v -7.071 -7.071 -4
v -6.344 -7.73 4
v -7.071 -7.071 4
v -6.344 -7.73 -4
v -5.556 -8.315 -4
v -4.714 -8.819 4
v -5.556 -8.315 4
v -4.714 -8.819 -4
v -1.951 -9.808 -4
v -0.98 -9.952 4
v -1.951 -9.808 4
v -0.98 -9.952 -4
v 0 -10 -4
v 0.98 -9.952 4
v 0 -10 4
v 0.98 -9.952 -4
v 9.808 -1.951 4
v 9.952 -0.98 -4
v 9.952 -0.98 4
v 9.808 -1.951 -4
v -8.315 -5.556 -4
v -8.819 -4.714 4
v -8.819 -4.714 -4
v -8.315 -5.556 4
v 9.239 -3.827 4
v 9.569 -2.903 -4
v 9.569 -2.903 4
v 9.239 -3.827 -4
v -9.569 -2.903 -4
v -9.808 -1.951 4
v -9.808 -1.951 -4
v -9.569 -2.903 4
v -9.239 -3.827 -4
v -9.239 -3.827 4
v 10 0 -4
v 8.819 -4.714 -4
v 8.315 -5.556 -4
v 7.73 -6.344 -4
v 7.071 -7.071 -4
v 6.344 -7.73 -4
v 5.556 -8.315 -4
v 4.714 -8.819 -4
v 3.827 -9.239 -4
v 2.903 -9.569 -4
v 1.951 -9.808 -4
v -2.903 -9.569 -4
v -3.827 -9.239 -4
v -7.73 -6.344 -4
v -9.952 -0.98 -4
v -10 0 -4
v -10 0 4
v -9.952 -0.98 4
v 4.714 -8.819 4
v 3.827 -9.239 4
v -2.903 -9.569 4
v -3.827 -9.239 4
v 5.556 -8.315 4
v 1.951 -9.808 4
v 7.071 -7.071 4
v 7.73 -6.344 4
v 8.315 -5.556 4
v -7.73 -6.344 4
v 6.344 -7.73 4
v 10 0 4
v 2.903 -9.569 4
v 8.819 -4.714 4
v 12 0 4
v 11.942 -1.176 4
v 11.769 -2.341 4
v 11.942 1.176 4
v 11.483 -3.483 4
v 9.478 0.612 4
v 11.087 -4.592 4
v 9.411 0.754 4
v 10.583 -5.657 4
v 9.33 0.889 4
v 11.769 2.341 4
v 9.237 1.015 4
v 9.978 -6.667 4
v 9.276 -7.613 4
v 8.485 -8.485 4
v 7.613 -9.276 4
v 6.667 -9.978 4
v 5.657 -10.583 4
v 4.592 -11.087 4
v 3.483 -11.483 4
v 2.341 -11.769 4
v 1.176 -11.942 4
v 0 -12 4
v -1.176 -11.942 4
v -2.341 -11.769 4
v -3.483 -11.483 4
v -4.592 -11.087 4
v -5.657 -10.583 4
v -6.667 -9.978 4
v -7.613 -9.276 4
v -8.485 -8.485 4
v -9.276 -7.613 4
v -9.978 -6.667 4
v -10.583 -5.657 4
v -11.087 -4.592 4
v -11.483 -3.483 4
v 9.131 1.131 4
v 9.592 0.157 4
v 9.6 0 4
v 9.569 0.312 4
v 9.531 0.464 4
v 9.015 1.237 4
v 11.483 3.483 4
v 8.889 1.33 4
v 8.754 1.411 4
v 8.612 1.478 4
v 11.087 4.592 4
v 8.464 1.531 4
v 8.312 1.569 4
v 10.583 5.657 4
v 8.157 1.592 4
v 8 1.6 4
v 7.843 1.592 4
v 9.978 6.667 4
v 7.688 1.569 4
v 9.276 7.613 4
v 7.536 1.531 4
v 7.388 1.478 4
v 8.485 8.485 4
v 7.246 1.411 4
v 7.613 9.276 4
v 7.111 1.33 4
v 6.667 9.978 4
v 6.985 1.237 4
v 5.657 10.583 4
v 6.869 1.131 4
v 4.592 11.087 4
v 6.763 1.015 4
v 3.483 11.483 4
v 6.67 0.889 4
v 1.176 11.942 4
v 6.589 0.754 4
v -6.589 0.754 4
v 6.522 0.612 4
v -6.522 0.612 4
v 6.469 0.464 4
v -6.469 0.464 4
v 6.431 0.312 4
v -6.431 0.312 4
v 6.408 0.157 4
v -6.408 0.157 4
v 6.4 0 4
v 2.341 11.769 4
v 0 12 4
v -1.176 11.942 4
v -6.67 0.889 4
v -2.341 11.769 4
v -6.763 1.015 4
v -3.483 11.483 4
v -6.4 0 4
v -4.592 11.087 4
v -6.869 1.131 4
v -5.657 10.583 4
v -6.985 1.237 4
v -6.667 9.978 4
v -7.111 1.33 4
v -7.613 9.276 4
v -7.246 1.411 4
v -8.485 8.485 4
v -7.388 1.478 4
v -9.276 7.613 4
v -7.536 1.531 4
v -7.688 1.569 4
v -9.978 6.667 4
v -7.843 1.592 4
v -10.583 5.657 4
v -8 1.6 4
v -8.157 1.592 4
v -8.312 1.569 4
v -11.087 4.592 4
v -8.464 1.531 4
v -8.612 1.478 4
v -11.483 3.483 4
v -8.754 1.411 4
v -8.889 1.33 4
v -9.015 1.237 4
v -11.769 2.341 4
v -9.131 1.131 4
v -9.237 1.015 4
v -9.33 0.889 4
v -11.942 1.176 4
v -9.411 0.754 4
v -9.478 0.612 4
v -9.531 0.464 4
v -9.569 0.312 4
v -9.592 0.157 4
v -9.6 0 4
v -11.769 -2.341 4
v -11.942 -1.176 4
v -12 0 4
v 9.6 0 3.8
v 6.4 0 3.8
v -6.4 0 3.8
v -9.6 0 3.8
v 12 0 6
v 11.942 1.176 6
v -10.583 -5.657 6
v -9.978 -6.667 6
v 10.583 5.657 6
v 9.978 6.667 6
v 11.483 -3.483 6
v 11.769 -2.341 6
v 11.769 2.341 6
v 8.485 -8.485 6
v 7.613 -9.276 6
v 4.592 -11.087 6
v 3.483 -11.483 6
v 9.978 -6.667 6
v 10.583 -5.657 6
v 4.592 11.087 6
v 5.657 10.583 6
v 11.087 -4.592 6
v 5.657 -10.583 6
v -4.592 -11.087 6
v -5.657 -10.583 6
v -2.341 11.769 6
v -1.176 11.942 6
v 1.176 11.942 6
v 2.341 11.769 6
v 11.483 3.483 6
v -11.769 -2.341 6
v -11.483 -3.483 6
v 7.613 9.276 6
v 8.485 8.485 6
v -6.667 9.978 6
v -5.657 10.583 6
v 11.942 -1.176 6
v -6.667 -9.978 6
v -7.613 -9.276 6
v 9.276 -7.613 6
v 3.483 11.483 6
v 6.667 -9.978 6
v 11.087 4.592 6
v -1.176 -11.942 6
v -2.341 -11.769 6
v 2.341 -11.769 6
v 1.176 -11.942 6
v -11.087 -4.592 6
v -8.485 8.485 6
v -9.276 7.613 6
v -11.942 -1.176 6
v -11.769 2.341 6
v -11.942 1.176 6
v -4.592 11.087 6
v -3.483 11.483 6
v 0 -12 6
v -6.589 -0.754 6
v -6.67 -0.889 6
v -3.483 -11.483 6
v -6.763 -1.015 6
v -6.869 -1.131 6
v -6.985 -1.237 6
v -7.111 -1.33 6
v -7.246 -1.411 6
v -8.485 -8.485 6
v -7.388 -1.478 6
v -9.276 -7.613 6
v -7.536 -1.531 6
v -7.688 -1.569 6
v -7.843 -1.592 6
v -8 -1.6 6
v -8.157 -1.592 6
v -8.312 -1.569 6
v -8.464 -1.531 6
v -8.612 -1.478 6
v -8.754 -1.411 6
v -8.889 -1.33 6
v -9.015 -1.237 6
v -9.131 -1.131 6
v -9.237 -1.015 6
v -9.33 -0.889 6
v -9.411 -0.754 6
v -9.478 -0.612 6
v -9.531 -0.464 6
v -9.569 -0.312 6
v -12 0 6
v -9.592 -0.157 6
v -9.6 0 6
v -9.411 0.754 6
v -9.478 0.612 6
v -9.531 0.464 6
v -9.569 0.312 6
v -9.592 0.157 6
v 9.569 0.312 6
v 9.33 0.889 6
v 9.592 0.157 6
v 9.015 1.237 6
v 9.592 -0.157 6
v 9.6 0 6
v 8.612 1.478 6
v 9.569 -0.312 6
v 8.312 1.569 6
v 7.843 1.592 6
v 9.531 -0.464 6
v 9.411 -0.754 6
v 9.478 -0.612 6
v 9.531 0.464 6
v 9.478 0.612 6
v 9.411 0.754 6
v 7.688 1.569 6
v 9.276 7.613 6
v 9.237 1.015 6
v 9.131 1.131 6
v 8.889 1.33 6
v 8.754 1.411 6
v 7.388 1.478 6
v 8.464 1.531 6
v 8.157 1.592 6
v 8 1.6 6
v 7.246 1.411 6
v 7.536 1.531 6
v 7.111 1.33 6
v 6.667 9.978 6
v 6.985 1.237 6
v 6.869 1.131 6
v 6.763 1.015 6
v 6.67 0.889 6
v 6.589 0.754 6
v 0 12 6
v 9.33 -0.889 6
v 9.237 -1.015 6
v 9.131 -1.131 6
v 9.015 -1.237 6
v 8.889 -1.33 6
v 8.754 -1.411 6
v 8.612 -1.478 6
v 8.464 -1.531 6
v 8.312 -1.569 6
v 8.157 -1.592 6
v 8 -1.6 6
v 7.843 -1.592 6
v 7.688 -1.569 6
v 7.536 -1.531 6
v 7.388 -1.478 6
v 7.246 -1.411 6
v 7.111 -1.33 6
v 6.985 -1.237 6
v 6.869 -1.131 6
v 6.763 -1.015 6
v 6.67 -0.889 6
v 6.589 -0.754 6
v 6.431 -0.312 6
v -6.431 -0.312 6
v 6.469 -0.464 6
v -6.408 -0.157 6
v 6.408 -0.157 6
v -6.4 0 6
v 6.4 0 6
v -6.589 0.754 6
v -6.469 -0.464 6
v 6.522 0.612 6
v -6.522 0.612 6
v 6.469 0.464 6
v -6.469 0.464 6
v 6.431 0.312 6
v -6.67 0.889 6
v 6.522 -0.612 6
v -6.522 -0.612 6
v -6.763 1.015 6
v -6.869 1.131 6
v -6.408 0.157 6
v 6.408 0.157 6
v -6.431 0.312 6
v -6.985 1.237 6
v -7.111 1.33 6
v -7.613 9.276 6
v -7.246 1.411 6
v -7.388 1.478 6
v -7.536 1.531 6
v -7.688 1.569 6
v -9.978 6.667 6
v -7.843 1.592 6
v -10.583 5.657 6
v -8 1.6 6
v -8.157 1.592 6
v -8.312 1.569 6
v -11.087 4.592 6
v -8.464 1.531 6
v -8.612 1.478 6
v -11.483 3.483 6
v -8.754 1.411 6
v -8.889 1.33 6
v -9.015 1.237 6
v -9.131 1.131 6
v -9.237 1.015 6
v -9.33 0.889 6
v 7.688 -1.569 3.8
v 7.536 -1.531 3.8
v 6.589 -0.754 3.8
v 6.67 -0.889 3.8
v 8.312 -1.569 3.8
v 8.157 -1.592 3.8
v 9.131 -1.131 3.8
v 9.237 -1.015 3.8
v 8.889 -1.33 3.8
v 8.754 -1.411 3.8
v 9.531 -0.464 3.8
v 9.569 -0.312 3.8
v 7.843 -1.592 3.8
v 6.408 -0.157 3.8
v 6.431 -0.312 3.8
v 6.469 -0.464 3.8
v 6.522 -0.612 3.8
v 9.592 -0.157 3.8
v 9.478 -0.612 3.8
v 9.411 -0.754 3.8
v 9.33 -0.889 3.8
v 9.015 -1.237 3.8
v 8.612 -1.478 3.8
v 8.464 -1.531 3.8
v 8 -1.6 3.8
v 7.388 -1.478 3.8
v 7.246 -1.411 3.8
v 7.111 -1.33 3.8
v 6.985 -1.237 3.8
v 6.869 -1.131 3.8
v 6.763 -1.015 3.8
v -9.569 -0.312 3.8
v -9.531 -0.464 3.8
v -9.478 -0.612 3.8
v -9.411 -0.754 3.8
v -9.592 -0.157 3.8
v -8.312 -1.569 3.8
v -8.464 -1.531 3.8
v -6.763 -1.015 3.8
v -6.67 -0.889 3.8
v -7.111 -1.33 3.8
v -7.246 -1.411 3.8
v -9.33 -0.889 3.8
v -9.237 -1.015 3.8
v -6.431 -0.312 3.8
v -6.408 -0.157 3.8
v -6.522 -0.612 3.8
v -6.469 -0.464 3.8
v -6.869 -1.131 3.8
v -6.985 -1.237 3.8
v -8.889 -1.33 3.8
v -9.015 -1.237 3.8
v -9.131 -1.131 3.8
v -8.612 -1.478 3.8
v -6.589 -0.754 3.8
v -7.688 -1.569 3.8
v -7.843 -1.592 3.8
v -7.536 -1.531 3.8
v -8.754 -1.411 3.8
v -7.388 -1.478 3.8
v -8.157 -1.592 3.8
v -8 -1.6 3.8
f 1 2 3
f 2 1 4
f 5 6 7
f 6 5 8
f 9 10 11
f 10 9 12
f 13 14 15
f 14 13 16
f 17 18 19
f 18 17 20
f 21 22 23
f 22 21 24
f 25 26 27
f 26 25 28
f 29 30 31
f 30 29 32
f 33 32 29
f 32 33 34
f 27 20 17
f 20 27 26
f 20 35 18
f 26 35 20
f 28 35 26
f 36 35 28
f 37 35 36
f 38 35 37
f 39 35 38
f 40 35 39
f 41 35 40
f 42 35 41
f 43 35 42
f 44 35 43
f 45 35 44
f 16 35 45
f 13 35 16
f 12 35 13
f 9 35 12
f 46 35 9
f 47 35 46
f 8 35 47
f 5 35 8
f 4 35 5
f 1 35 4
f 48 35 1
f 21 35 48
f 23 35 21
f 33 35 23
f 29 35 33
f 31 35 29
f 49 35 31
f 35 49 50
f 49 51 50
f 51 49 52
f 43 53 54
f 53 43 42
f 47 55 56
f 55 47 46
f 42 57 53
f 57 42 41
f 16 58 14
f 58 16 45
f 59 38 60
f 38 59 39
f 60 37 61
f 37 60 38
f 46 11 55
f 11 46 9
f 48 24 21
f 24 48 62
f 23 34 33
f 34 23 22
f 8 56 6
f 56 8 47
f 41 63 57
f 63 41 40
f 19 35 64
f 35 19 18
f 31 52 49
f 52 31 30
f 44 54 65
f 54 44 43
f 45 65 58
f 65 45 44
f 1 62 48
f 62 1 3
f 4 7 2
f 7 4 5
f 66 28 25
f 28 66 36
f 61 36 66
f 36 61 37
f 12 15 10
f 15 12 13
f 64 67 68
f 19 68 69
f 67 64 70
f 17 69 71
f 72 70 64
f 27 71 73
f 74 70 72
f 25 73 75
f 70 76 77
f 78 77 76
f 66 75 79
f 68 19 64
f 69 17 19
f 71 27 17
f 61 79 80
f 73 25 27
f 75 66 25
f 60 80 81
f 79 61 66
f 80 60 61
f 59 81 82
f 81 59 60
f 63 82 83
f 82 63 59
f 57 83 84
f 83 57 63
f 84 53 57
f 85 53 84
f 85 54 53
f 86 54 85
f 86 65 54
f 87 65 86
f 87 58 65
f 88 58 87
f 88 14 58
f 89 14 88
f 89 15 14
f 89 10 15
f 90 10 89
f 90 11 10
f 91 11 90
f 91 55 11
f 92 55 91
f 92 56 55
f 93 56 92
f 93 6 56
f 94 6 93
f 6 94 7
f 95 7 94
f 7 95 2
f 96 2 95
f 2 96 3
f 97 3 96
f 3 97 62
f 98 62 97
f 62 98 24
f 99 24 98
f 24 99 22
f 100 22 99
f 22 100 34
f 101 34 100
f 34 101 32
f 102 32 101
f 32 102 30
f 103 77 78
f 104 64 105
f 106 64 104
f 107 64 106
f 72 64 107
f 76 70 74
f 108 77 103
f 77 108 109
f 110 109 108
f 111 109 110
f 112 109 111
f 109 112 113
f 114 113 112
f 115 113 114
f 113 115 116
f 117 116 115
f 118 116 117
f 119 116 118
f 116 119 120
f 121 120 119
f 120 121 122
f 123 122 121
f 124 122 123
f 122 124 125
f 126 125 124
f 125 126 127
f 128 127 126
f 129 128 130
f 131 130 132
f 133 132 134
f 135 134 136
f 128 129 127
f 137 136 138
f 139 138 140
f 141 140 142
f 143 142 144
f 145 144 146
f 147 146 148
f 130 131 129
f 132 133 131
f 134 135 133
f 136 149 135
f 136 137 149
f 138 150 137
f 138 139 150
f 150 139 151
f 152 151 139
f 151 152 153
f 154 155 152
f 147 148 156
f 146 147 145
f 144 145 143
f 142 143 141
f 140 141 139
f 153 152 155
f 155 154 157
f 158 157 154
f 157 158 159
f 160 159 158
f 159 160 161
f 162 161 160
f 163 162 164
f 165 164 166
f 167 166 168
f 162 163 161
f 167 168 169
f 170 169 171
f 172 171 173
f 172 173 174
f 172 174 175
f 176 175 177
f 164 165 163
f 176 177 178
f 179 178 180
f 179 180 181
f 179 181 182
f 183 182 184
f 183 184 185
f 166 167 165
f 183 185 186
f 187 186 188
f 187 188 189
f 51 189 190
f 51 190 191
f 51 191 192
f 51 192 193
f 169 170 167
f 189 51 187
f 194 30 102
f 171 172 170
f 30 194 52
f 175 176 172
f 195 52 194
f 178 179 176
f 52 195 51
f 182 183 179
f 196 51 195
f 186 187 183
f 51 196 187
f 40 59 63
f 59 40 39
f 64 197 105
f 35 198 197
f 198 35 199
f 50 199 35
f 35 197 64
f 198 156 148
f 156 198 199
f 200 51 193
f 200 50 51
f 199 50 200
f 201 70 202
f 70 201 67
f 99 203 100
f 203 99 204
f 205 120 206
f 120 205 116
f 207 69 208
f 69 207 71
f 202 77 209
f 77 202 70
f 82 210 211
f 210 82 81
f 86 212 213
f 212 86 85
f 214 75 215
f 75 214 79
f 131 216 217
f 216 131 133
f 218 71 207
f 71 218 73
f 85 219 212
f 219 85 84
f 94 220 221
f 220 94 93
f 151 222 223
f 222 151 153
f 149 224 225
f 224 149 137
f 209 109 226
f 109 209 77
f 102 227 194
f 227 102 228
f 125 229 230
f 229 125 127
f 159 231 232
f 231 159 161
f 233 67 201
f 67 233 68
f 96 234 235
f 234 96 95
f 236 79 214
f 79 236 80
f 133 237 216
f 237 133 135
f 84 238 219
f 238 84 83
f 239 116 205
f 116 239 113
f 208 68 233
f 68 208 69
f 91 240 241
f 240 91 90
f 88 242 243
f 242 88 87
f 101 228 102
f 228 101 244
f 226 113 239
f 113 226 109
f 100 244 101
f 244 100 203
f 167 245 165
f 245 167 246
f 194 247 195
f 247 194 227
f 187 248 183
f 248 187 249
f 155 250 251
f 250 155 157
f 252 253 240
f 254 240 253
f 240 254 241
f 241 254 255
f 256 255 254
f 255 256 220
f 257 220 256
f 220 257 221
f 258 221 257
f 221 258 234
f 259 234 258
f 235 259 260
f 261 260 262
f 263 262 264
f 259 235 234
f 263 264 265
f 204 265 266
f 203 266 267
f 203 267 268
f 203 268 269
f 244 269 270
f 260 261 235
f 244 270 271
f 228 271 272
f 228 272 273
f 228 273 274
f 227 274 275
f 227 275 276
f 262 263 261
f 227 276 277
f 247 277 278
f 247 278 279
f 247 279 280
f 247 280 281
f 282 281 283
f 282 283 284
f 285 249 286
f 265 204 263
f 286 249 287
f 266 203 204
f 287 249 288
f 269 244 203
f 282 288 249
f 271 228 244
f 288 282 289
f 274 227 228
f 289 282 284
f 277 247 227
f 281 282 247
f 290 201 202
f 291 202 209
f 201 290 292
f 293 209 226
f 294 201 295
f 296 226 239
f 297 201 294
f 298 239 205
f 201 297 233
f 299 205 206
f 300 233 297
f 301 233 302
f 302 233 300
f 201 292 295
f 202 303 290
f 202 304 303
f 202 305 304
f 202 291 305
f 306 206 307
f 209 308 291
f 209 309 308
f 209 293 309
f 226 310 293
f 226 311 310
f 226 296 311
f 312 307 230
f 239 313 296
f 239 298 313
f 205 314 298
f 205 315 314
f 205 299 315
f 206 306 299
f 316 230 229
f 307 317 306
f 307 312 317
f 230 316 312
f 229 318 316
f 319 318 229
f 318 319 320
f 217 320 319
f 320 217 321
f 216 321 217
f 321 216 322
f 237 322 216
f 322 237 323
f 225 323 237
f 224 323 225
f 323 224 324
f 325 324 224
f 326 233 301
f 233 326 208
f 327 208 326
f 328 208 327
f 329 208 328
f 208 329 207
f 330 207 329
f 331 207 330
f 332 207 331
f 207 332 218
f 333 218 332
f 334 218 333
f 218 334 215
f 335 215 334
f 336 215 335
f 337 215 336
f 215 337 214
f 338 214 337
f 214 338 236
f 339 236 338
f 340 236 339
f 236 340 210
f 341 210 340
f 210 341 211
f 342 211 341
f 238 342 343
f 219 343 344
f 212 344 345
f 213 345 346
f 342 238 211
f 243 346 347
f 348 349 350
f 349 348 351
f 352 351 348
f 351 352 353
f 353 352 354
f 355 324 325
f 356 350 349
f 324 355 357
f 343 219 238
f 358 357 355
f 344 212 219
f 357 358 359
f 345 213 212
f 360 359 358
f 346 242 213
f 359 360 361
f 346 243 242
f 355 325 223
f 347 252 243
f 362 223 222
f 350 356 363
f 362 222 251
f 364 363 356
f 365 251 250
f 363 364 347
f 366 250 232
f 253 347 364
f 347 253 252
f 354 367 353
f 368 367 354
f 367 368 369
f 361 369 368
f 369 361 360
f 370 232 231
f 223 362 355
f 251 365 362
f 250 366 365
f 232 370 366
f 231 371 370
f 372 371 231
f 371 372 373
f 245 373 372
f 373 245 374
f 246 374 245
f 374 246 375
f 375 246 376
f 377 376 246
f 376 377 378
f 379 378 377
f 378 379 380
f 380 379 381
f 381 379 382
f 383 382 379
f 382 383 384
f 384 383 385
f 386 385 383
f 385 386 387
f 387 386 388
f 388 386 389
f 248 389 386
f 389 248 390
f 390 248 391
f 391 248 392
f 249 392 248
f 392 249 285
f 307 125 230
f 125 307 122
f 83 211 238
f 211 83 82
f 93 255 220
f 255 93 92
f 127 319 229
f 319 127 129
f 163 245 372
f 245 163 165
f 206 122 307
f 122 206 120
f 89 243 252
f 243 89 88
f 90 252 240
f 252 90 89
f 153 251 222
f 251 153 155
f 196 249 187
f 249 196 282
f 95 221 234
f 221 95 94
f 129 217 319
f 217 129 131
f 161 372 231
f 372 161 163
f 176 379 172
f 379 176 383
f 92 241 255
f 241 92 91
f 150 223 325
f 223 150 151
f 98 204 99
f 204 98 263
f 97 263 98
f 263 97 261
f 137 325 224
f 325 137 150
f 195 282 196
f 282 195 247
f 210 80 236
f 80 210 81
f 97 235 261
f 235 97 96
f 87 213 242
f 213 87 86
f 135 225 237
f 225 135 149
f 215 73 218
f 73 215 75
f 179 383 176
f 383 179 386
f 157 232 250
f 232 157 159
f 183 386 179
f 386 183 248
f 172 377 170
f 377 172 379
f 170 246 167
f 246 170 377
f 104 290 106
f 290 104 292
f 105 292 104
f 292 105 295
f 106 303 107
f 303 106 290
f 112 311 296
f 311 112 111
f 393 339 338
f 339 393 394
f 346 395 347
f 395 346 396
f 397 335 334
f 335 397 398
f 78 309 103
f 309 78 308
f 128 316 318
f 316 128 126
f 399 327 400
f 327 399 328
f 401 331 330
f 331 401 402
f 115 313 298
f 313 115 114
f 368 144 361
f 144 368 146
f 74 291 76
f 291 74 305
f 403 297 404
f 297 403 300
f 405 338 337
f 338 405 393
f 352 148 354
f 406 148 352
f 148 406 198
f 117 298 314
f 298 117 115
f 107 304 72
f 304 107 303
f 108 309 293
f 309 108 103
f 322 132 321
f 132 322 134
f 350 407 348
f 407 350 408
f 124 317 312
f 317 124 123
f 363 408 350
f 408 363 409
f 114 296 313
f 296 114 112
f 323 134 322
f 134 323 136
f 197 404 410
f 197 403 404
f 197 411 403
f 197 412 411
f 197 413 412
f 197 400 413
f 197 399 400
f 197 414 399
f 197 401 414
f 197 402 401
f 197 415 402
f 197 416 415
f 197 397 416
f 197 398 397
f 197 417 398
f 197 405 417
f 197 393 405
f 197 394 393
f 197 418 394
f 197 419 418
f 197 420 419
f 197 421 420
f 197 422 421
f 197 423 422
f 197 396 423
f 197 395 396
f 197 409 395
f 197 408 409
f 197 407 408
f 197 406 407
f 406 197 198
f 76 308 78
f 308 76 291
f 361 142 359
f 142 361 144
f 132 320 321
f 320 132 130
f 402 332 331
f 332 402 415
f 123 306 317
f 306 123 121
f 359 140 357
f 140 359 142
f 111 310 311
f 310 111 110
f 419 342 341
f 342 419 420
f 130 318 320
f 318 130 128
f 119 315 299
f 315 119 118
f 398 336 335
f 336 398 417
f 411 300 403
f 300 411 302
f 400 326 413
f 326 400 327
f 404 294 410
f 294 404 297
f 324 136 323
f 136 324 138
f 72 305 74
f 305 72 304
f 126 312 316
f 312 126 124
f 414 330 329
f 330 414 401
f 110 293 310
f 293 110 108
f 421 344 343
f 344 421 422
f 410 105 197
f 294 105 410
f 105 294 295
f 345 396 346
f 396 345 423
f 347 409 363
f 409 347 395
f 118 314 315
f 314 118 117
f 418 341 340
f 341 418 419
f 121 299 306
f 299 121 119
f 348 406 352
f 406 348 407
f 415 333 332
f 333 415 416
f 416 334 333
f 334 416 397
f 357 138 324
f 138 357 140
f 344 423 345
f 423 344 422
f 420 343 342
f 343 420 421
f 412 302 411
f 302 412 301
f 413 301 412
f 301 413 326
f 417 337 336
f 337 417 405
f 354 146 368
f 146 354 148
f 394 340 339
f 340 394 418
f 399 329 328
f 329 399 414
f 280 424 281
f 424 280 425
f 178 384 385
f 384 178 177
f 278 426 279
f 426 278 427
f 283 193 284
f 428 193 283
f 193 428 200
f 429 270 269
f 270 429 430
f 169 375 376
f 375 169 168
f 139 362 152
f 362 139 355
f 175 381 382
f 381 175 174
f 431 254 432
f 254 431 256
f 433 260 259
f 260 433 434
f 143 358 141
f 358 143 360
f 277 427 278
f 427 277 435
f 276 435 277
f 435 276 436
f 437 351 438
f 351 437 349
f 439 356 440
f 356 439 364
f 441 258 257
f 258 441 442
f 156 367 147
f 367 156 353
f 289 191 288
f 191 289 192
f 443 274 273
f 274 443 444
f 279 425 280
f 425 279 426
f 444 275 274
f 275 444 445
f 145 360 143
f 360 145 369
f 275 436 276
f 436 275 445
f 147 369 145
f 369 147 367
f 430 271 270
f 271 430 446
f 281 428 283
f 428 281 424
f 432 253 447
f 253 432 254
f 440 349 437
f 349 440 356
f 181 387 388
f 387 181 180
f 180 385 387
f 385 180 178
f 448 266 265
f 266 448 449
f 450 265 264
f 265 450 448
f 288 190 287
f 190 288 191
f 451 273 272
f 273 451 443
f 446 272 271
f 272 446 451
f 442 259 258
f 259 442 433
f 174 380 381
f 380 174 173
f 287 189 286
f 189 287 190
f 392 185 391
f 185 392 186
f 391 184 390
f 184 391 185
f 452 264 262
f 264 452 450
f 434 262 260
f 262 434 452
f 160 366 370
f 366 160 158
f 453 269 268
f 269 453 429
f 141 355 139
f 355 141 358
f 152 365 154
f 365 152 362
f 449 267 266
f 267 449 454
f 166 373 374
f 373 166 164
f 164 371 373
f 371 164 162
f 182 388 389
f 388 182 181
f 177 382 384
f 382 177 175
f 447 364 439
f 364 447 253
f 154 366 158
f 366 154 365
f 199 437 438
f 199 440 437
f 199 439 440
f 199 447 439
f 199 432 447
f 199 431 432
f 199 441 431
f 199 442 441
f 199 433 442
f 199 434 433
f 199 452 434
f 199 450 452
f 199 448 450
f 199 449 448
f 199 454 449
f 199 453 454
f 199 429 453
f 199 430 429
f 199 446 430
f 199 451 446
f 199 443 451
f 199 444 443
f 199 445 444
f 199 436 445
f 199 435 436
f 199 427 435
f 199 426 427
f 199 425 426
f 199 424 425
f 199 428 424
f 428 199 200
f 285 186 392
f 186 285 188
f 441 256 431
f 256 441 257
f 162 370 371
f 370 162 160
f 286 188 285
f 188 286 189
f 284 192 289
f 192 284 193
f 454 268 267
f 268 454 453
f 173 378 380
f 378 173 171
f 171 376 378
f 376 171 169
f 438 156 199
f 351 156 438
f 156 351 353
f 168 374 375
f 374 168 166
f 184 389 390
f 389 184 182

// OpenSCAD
$fn=64;

module d_profile(r=10, depth=8){
    intersection(){
        cylinder(h=depth, r=r, center=true);
        translate([0, -r/2, 0]) cube([2*r, r, depth+0.2], center=true);
    }
}

module d_connector(body_r=10, body_depth=8, flange_th=2, flange_r=12, hole_r=1.6, hole_offset=8){
    difference(){
        union(){
            d_profile(r=body_r, depth=body_depth);
            translate([0,0,(body_depth+flange_th)/2])
                cylinder(h=flange_th, r=flange_r, center=true);
        }
        for(a=[0,180]){
            rotate([0,0,a])
                translate([hole_offset,0,(body_depth+flange_th)/2])
                    cylinder(h=flange_th+0.4, r=hole_r, center=true);
        }
    }
}

d_connector();
